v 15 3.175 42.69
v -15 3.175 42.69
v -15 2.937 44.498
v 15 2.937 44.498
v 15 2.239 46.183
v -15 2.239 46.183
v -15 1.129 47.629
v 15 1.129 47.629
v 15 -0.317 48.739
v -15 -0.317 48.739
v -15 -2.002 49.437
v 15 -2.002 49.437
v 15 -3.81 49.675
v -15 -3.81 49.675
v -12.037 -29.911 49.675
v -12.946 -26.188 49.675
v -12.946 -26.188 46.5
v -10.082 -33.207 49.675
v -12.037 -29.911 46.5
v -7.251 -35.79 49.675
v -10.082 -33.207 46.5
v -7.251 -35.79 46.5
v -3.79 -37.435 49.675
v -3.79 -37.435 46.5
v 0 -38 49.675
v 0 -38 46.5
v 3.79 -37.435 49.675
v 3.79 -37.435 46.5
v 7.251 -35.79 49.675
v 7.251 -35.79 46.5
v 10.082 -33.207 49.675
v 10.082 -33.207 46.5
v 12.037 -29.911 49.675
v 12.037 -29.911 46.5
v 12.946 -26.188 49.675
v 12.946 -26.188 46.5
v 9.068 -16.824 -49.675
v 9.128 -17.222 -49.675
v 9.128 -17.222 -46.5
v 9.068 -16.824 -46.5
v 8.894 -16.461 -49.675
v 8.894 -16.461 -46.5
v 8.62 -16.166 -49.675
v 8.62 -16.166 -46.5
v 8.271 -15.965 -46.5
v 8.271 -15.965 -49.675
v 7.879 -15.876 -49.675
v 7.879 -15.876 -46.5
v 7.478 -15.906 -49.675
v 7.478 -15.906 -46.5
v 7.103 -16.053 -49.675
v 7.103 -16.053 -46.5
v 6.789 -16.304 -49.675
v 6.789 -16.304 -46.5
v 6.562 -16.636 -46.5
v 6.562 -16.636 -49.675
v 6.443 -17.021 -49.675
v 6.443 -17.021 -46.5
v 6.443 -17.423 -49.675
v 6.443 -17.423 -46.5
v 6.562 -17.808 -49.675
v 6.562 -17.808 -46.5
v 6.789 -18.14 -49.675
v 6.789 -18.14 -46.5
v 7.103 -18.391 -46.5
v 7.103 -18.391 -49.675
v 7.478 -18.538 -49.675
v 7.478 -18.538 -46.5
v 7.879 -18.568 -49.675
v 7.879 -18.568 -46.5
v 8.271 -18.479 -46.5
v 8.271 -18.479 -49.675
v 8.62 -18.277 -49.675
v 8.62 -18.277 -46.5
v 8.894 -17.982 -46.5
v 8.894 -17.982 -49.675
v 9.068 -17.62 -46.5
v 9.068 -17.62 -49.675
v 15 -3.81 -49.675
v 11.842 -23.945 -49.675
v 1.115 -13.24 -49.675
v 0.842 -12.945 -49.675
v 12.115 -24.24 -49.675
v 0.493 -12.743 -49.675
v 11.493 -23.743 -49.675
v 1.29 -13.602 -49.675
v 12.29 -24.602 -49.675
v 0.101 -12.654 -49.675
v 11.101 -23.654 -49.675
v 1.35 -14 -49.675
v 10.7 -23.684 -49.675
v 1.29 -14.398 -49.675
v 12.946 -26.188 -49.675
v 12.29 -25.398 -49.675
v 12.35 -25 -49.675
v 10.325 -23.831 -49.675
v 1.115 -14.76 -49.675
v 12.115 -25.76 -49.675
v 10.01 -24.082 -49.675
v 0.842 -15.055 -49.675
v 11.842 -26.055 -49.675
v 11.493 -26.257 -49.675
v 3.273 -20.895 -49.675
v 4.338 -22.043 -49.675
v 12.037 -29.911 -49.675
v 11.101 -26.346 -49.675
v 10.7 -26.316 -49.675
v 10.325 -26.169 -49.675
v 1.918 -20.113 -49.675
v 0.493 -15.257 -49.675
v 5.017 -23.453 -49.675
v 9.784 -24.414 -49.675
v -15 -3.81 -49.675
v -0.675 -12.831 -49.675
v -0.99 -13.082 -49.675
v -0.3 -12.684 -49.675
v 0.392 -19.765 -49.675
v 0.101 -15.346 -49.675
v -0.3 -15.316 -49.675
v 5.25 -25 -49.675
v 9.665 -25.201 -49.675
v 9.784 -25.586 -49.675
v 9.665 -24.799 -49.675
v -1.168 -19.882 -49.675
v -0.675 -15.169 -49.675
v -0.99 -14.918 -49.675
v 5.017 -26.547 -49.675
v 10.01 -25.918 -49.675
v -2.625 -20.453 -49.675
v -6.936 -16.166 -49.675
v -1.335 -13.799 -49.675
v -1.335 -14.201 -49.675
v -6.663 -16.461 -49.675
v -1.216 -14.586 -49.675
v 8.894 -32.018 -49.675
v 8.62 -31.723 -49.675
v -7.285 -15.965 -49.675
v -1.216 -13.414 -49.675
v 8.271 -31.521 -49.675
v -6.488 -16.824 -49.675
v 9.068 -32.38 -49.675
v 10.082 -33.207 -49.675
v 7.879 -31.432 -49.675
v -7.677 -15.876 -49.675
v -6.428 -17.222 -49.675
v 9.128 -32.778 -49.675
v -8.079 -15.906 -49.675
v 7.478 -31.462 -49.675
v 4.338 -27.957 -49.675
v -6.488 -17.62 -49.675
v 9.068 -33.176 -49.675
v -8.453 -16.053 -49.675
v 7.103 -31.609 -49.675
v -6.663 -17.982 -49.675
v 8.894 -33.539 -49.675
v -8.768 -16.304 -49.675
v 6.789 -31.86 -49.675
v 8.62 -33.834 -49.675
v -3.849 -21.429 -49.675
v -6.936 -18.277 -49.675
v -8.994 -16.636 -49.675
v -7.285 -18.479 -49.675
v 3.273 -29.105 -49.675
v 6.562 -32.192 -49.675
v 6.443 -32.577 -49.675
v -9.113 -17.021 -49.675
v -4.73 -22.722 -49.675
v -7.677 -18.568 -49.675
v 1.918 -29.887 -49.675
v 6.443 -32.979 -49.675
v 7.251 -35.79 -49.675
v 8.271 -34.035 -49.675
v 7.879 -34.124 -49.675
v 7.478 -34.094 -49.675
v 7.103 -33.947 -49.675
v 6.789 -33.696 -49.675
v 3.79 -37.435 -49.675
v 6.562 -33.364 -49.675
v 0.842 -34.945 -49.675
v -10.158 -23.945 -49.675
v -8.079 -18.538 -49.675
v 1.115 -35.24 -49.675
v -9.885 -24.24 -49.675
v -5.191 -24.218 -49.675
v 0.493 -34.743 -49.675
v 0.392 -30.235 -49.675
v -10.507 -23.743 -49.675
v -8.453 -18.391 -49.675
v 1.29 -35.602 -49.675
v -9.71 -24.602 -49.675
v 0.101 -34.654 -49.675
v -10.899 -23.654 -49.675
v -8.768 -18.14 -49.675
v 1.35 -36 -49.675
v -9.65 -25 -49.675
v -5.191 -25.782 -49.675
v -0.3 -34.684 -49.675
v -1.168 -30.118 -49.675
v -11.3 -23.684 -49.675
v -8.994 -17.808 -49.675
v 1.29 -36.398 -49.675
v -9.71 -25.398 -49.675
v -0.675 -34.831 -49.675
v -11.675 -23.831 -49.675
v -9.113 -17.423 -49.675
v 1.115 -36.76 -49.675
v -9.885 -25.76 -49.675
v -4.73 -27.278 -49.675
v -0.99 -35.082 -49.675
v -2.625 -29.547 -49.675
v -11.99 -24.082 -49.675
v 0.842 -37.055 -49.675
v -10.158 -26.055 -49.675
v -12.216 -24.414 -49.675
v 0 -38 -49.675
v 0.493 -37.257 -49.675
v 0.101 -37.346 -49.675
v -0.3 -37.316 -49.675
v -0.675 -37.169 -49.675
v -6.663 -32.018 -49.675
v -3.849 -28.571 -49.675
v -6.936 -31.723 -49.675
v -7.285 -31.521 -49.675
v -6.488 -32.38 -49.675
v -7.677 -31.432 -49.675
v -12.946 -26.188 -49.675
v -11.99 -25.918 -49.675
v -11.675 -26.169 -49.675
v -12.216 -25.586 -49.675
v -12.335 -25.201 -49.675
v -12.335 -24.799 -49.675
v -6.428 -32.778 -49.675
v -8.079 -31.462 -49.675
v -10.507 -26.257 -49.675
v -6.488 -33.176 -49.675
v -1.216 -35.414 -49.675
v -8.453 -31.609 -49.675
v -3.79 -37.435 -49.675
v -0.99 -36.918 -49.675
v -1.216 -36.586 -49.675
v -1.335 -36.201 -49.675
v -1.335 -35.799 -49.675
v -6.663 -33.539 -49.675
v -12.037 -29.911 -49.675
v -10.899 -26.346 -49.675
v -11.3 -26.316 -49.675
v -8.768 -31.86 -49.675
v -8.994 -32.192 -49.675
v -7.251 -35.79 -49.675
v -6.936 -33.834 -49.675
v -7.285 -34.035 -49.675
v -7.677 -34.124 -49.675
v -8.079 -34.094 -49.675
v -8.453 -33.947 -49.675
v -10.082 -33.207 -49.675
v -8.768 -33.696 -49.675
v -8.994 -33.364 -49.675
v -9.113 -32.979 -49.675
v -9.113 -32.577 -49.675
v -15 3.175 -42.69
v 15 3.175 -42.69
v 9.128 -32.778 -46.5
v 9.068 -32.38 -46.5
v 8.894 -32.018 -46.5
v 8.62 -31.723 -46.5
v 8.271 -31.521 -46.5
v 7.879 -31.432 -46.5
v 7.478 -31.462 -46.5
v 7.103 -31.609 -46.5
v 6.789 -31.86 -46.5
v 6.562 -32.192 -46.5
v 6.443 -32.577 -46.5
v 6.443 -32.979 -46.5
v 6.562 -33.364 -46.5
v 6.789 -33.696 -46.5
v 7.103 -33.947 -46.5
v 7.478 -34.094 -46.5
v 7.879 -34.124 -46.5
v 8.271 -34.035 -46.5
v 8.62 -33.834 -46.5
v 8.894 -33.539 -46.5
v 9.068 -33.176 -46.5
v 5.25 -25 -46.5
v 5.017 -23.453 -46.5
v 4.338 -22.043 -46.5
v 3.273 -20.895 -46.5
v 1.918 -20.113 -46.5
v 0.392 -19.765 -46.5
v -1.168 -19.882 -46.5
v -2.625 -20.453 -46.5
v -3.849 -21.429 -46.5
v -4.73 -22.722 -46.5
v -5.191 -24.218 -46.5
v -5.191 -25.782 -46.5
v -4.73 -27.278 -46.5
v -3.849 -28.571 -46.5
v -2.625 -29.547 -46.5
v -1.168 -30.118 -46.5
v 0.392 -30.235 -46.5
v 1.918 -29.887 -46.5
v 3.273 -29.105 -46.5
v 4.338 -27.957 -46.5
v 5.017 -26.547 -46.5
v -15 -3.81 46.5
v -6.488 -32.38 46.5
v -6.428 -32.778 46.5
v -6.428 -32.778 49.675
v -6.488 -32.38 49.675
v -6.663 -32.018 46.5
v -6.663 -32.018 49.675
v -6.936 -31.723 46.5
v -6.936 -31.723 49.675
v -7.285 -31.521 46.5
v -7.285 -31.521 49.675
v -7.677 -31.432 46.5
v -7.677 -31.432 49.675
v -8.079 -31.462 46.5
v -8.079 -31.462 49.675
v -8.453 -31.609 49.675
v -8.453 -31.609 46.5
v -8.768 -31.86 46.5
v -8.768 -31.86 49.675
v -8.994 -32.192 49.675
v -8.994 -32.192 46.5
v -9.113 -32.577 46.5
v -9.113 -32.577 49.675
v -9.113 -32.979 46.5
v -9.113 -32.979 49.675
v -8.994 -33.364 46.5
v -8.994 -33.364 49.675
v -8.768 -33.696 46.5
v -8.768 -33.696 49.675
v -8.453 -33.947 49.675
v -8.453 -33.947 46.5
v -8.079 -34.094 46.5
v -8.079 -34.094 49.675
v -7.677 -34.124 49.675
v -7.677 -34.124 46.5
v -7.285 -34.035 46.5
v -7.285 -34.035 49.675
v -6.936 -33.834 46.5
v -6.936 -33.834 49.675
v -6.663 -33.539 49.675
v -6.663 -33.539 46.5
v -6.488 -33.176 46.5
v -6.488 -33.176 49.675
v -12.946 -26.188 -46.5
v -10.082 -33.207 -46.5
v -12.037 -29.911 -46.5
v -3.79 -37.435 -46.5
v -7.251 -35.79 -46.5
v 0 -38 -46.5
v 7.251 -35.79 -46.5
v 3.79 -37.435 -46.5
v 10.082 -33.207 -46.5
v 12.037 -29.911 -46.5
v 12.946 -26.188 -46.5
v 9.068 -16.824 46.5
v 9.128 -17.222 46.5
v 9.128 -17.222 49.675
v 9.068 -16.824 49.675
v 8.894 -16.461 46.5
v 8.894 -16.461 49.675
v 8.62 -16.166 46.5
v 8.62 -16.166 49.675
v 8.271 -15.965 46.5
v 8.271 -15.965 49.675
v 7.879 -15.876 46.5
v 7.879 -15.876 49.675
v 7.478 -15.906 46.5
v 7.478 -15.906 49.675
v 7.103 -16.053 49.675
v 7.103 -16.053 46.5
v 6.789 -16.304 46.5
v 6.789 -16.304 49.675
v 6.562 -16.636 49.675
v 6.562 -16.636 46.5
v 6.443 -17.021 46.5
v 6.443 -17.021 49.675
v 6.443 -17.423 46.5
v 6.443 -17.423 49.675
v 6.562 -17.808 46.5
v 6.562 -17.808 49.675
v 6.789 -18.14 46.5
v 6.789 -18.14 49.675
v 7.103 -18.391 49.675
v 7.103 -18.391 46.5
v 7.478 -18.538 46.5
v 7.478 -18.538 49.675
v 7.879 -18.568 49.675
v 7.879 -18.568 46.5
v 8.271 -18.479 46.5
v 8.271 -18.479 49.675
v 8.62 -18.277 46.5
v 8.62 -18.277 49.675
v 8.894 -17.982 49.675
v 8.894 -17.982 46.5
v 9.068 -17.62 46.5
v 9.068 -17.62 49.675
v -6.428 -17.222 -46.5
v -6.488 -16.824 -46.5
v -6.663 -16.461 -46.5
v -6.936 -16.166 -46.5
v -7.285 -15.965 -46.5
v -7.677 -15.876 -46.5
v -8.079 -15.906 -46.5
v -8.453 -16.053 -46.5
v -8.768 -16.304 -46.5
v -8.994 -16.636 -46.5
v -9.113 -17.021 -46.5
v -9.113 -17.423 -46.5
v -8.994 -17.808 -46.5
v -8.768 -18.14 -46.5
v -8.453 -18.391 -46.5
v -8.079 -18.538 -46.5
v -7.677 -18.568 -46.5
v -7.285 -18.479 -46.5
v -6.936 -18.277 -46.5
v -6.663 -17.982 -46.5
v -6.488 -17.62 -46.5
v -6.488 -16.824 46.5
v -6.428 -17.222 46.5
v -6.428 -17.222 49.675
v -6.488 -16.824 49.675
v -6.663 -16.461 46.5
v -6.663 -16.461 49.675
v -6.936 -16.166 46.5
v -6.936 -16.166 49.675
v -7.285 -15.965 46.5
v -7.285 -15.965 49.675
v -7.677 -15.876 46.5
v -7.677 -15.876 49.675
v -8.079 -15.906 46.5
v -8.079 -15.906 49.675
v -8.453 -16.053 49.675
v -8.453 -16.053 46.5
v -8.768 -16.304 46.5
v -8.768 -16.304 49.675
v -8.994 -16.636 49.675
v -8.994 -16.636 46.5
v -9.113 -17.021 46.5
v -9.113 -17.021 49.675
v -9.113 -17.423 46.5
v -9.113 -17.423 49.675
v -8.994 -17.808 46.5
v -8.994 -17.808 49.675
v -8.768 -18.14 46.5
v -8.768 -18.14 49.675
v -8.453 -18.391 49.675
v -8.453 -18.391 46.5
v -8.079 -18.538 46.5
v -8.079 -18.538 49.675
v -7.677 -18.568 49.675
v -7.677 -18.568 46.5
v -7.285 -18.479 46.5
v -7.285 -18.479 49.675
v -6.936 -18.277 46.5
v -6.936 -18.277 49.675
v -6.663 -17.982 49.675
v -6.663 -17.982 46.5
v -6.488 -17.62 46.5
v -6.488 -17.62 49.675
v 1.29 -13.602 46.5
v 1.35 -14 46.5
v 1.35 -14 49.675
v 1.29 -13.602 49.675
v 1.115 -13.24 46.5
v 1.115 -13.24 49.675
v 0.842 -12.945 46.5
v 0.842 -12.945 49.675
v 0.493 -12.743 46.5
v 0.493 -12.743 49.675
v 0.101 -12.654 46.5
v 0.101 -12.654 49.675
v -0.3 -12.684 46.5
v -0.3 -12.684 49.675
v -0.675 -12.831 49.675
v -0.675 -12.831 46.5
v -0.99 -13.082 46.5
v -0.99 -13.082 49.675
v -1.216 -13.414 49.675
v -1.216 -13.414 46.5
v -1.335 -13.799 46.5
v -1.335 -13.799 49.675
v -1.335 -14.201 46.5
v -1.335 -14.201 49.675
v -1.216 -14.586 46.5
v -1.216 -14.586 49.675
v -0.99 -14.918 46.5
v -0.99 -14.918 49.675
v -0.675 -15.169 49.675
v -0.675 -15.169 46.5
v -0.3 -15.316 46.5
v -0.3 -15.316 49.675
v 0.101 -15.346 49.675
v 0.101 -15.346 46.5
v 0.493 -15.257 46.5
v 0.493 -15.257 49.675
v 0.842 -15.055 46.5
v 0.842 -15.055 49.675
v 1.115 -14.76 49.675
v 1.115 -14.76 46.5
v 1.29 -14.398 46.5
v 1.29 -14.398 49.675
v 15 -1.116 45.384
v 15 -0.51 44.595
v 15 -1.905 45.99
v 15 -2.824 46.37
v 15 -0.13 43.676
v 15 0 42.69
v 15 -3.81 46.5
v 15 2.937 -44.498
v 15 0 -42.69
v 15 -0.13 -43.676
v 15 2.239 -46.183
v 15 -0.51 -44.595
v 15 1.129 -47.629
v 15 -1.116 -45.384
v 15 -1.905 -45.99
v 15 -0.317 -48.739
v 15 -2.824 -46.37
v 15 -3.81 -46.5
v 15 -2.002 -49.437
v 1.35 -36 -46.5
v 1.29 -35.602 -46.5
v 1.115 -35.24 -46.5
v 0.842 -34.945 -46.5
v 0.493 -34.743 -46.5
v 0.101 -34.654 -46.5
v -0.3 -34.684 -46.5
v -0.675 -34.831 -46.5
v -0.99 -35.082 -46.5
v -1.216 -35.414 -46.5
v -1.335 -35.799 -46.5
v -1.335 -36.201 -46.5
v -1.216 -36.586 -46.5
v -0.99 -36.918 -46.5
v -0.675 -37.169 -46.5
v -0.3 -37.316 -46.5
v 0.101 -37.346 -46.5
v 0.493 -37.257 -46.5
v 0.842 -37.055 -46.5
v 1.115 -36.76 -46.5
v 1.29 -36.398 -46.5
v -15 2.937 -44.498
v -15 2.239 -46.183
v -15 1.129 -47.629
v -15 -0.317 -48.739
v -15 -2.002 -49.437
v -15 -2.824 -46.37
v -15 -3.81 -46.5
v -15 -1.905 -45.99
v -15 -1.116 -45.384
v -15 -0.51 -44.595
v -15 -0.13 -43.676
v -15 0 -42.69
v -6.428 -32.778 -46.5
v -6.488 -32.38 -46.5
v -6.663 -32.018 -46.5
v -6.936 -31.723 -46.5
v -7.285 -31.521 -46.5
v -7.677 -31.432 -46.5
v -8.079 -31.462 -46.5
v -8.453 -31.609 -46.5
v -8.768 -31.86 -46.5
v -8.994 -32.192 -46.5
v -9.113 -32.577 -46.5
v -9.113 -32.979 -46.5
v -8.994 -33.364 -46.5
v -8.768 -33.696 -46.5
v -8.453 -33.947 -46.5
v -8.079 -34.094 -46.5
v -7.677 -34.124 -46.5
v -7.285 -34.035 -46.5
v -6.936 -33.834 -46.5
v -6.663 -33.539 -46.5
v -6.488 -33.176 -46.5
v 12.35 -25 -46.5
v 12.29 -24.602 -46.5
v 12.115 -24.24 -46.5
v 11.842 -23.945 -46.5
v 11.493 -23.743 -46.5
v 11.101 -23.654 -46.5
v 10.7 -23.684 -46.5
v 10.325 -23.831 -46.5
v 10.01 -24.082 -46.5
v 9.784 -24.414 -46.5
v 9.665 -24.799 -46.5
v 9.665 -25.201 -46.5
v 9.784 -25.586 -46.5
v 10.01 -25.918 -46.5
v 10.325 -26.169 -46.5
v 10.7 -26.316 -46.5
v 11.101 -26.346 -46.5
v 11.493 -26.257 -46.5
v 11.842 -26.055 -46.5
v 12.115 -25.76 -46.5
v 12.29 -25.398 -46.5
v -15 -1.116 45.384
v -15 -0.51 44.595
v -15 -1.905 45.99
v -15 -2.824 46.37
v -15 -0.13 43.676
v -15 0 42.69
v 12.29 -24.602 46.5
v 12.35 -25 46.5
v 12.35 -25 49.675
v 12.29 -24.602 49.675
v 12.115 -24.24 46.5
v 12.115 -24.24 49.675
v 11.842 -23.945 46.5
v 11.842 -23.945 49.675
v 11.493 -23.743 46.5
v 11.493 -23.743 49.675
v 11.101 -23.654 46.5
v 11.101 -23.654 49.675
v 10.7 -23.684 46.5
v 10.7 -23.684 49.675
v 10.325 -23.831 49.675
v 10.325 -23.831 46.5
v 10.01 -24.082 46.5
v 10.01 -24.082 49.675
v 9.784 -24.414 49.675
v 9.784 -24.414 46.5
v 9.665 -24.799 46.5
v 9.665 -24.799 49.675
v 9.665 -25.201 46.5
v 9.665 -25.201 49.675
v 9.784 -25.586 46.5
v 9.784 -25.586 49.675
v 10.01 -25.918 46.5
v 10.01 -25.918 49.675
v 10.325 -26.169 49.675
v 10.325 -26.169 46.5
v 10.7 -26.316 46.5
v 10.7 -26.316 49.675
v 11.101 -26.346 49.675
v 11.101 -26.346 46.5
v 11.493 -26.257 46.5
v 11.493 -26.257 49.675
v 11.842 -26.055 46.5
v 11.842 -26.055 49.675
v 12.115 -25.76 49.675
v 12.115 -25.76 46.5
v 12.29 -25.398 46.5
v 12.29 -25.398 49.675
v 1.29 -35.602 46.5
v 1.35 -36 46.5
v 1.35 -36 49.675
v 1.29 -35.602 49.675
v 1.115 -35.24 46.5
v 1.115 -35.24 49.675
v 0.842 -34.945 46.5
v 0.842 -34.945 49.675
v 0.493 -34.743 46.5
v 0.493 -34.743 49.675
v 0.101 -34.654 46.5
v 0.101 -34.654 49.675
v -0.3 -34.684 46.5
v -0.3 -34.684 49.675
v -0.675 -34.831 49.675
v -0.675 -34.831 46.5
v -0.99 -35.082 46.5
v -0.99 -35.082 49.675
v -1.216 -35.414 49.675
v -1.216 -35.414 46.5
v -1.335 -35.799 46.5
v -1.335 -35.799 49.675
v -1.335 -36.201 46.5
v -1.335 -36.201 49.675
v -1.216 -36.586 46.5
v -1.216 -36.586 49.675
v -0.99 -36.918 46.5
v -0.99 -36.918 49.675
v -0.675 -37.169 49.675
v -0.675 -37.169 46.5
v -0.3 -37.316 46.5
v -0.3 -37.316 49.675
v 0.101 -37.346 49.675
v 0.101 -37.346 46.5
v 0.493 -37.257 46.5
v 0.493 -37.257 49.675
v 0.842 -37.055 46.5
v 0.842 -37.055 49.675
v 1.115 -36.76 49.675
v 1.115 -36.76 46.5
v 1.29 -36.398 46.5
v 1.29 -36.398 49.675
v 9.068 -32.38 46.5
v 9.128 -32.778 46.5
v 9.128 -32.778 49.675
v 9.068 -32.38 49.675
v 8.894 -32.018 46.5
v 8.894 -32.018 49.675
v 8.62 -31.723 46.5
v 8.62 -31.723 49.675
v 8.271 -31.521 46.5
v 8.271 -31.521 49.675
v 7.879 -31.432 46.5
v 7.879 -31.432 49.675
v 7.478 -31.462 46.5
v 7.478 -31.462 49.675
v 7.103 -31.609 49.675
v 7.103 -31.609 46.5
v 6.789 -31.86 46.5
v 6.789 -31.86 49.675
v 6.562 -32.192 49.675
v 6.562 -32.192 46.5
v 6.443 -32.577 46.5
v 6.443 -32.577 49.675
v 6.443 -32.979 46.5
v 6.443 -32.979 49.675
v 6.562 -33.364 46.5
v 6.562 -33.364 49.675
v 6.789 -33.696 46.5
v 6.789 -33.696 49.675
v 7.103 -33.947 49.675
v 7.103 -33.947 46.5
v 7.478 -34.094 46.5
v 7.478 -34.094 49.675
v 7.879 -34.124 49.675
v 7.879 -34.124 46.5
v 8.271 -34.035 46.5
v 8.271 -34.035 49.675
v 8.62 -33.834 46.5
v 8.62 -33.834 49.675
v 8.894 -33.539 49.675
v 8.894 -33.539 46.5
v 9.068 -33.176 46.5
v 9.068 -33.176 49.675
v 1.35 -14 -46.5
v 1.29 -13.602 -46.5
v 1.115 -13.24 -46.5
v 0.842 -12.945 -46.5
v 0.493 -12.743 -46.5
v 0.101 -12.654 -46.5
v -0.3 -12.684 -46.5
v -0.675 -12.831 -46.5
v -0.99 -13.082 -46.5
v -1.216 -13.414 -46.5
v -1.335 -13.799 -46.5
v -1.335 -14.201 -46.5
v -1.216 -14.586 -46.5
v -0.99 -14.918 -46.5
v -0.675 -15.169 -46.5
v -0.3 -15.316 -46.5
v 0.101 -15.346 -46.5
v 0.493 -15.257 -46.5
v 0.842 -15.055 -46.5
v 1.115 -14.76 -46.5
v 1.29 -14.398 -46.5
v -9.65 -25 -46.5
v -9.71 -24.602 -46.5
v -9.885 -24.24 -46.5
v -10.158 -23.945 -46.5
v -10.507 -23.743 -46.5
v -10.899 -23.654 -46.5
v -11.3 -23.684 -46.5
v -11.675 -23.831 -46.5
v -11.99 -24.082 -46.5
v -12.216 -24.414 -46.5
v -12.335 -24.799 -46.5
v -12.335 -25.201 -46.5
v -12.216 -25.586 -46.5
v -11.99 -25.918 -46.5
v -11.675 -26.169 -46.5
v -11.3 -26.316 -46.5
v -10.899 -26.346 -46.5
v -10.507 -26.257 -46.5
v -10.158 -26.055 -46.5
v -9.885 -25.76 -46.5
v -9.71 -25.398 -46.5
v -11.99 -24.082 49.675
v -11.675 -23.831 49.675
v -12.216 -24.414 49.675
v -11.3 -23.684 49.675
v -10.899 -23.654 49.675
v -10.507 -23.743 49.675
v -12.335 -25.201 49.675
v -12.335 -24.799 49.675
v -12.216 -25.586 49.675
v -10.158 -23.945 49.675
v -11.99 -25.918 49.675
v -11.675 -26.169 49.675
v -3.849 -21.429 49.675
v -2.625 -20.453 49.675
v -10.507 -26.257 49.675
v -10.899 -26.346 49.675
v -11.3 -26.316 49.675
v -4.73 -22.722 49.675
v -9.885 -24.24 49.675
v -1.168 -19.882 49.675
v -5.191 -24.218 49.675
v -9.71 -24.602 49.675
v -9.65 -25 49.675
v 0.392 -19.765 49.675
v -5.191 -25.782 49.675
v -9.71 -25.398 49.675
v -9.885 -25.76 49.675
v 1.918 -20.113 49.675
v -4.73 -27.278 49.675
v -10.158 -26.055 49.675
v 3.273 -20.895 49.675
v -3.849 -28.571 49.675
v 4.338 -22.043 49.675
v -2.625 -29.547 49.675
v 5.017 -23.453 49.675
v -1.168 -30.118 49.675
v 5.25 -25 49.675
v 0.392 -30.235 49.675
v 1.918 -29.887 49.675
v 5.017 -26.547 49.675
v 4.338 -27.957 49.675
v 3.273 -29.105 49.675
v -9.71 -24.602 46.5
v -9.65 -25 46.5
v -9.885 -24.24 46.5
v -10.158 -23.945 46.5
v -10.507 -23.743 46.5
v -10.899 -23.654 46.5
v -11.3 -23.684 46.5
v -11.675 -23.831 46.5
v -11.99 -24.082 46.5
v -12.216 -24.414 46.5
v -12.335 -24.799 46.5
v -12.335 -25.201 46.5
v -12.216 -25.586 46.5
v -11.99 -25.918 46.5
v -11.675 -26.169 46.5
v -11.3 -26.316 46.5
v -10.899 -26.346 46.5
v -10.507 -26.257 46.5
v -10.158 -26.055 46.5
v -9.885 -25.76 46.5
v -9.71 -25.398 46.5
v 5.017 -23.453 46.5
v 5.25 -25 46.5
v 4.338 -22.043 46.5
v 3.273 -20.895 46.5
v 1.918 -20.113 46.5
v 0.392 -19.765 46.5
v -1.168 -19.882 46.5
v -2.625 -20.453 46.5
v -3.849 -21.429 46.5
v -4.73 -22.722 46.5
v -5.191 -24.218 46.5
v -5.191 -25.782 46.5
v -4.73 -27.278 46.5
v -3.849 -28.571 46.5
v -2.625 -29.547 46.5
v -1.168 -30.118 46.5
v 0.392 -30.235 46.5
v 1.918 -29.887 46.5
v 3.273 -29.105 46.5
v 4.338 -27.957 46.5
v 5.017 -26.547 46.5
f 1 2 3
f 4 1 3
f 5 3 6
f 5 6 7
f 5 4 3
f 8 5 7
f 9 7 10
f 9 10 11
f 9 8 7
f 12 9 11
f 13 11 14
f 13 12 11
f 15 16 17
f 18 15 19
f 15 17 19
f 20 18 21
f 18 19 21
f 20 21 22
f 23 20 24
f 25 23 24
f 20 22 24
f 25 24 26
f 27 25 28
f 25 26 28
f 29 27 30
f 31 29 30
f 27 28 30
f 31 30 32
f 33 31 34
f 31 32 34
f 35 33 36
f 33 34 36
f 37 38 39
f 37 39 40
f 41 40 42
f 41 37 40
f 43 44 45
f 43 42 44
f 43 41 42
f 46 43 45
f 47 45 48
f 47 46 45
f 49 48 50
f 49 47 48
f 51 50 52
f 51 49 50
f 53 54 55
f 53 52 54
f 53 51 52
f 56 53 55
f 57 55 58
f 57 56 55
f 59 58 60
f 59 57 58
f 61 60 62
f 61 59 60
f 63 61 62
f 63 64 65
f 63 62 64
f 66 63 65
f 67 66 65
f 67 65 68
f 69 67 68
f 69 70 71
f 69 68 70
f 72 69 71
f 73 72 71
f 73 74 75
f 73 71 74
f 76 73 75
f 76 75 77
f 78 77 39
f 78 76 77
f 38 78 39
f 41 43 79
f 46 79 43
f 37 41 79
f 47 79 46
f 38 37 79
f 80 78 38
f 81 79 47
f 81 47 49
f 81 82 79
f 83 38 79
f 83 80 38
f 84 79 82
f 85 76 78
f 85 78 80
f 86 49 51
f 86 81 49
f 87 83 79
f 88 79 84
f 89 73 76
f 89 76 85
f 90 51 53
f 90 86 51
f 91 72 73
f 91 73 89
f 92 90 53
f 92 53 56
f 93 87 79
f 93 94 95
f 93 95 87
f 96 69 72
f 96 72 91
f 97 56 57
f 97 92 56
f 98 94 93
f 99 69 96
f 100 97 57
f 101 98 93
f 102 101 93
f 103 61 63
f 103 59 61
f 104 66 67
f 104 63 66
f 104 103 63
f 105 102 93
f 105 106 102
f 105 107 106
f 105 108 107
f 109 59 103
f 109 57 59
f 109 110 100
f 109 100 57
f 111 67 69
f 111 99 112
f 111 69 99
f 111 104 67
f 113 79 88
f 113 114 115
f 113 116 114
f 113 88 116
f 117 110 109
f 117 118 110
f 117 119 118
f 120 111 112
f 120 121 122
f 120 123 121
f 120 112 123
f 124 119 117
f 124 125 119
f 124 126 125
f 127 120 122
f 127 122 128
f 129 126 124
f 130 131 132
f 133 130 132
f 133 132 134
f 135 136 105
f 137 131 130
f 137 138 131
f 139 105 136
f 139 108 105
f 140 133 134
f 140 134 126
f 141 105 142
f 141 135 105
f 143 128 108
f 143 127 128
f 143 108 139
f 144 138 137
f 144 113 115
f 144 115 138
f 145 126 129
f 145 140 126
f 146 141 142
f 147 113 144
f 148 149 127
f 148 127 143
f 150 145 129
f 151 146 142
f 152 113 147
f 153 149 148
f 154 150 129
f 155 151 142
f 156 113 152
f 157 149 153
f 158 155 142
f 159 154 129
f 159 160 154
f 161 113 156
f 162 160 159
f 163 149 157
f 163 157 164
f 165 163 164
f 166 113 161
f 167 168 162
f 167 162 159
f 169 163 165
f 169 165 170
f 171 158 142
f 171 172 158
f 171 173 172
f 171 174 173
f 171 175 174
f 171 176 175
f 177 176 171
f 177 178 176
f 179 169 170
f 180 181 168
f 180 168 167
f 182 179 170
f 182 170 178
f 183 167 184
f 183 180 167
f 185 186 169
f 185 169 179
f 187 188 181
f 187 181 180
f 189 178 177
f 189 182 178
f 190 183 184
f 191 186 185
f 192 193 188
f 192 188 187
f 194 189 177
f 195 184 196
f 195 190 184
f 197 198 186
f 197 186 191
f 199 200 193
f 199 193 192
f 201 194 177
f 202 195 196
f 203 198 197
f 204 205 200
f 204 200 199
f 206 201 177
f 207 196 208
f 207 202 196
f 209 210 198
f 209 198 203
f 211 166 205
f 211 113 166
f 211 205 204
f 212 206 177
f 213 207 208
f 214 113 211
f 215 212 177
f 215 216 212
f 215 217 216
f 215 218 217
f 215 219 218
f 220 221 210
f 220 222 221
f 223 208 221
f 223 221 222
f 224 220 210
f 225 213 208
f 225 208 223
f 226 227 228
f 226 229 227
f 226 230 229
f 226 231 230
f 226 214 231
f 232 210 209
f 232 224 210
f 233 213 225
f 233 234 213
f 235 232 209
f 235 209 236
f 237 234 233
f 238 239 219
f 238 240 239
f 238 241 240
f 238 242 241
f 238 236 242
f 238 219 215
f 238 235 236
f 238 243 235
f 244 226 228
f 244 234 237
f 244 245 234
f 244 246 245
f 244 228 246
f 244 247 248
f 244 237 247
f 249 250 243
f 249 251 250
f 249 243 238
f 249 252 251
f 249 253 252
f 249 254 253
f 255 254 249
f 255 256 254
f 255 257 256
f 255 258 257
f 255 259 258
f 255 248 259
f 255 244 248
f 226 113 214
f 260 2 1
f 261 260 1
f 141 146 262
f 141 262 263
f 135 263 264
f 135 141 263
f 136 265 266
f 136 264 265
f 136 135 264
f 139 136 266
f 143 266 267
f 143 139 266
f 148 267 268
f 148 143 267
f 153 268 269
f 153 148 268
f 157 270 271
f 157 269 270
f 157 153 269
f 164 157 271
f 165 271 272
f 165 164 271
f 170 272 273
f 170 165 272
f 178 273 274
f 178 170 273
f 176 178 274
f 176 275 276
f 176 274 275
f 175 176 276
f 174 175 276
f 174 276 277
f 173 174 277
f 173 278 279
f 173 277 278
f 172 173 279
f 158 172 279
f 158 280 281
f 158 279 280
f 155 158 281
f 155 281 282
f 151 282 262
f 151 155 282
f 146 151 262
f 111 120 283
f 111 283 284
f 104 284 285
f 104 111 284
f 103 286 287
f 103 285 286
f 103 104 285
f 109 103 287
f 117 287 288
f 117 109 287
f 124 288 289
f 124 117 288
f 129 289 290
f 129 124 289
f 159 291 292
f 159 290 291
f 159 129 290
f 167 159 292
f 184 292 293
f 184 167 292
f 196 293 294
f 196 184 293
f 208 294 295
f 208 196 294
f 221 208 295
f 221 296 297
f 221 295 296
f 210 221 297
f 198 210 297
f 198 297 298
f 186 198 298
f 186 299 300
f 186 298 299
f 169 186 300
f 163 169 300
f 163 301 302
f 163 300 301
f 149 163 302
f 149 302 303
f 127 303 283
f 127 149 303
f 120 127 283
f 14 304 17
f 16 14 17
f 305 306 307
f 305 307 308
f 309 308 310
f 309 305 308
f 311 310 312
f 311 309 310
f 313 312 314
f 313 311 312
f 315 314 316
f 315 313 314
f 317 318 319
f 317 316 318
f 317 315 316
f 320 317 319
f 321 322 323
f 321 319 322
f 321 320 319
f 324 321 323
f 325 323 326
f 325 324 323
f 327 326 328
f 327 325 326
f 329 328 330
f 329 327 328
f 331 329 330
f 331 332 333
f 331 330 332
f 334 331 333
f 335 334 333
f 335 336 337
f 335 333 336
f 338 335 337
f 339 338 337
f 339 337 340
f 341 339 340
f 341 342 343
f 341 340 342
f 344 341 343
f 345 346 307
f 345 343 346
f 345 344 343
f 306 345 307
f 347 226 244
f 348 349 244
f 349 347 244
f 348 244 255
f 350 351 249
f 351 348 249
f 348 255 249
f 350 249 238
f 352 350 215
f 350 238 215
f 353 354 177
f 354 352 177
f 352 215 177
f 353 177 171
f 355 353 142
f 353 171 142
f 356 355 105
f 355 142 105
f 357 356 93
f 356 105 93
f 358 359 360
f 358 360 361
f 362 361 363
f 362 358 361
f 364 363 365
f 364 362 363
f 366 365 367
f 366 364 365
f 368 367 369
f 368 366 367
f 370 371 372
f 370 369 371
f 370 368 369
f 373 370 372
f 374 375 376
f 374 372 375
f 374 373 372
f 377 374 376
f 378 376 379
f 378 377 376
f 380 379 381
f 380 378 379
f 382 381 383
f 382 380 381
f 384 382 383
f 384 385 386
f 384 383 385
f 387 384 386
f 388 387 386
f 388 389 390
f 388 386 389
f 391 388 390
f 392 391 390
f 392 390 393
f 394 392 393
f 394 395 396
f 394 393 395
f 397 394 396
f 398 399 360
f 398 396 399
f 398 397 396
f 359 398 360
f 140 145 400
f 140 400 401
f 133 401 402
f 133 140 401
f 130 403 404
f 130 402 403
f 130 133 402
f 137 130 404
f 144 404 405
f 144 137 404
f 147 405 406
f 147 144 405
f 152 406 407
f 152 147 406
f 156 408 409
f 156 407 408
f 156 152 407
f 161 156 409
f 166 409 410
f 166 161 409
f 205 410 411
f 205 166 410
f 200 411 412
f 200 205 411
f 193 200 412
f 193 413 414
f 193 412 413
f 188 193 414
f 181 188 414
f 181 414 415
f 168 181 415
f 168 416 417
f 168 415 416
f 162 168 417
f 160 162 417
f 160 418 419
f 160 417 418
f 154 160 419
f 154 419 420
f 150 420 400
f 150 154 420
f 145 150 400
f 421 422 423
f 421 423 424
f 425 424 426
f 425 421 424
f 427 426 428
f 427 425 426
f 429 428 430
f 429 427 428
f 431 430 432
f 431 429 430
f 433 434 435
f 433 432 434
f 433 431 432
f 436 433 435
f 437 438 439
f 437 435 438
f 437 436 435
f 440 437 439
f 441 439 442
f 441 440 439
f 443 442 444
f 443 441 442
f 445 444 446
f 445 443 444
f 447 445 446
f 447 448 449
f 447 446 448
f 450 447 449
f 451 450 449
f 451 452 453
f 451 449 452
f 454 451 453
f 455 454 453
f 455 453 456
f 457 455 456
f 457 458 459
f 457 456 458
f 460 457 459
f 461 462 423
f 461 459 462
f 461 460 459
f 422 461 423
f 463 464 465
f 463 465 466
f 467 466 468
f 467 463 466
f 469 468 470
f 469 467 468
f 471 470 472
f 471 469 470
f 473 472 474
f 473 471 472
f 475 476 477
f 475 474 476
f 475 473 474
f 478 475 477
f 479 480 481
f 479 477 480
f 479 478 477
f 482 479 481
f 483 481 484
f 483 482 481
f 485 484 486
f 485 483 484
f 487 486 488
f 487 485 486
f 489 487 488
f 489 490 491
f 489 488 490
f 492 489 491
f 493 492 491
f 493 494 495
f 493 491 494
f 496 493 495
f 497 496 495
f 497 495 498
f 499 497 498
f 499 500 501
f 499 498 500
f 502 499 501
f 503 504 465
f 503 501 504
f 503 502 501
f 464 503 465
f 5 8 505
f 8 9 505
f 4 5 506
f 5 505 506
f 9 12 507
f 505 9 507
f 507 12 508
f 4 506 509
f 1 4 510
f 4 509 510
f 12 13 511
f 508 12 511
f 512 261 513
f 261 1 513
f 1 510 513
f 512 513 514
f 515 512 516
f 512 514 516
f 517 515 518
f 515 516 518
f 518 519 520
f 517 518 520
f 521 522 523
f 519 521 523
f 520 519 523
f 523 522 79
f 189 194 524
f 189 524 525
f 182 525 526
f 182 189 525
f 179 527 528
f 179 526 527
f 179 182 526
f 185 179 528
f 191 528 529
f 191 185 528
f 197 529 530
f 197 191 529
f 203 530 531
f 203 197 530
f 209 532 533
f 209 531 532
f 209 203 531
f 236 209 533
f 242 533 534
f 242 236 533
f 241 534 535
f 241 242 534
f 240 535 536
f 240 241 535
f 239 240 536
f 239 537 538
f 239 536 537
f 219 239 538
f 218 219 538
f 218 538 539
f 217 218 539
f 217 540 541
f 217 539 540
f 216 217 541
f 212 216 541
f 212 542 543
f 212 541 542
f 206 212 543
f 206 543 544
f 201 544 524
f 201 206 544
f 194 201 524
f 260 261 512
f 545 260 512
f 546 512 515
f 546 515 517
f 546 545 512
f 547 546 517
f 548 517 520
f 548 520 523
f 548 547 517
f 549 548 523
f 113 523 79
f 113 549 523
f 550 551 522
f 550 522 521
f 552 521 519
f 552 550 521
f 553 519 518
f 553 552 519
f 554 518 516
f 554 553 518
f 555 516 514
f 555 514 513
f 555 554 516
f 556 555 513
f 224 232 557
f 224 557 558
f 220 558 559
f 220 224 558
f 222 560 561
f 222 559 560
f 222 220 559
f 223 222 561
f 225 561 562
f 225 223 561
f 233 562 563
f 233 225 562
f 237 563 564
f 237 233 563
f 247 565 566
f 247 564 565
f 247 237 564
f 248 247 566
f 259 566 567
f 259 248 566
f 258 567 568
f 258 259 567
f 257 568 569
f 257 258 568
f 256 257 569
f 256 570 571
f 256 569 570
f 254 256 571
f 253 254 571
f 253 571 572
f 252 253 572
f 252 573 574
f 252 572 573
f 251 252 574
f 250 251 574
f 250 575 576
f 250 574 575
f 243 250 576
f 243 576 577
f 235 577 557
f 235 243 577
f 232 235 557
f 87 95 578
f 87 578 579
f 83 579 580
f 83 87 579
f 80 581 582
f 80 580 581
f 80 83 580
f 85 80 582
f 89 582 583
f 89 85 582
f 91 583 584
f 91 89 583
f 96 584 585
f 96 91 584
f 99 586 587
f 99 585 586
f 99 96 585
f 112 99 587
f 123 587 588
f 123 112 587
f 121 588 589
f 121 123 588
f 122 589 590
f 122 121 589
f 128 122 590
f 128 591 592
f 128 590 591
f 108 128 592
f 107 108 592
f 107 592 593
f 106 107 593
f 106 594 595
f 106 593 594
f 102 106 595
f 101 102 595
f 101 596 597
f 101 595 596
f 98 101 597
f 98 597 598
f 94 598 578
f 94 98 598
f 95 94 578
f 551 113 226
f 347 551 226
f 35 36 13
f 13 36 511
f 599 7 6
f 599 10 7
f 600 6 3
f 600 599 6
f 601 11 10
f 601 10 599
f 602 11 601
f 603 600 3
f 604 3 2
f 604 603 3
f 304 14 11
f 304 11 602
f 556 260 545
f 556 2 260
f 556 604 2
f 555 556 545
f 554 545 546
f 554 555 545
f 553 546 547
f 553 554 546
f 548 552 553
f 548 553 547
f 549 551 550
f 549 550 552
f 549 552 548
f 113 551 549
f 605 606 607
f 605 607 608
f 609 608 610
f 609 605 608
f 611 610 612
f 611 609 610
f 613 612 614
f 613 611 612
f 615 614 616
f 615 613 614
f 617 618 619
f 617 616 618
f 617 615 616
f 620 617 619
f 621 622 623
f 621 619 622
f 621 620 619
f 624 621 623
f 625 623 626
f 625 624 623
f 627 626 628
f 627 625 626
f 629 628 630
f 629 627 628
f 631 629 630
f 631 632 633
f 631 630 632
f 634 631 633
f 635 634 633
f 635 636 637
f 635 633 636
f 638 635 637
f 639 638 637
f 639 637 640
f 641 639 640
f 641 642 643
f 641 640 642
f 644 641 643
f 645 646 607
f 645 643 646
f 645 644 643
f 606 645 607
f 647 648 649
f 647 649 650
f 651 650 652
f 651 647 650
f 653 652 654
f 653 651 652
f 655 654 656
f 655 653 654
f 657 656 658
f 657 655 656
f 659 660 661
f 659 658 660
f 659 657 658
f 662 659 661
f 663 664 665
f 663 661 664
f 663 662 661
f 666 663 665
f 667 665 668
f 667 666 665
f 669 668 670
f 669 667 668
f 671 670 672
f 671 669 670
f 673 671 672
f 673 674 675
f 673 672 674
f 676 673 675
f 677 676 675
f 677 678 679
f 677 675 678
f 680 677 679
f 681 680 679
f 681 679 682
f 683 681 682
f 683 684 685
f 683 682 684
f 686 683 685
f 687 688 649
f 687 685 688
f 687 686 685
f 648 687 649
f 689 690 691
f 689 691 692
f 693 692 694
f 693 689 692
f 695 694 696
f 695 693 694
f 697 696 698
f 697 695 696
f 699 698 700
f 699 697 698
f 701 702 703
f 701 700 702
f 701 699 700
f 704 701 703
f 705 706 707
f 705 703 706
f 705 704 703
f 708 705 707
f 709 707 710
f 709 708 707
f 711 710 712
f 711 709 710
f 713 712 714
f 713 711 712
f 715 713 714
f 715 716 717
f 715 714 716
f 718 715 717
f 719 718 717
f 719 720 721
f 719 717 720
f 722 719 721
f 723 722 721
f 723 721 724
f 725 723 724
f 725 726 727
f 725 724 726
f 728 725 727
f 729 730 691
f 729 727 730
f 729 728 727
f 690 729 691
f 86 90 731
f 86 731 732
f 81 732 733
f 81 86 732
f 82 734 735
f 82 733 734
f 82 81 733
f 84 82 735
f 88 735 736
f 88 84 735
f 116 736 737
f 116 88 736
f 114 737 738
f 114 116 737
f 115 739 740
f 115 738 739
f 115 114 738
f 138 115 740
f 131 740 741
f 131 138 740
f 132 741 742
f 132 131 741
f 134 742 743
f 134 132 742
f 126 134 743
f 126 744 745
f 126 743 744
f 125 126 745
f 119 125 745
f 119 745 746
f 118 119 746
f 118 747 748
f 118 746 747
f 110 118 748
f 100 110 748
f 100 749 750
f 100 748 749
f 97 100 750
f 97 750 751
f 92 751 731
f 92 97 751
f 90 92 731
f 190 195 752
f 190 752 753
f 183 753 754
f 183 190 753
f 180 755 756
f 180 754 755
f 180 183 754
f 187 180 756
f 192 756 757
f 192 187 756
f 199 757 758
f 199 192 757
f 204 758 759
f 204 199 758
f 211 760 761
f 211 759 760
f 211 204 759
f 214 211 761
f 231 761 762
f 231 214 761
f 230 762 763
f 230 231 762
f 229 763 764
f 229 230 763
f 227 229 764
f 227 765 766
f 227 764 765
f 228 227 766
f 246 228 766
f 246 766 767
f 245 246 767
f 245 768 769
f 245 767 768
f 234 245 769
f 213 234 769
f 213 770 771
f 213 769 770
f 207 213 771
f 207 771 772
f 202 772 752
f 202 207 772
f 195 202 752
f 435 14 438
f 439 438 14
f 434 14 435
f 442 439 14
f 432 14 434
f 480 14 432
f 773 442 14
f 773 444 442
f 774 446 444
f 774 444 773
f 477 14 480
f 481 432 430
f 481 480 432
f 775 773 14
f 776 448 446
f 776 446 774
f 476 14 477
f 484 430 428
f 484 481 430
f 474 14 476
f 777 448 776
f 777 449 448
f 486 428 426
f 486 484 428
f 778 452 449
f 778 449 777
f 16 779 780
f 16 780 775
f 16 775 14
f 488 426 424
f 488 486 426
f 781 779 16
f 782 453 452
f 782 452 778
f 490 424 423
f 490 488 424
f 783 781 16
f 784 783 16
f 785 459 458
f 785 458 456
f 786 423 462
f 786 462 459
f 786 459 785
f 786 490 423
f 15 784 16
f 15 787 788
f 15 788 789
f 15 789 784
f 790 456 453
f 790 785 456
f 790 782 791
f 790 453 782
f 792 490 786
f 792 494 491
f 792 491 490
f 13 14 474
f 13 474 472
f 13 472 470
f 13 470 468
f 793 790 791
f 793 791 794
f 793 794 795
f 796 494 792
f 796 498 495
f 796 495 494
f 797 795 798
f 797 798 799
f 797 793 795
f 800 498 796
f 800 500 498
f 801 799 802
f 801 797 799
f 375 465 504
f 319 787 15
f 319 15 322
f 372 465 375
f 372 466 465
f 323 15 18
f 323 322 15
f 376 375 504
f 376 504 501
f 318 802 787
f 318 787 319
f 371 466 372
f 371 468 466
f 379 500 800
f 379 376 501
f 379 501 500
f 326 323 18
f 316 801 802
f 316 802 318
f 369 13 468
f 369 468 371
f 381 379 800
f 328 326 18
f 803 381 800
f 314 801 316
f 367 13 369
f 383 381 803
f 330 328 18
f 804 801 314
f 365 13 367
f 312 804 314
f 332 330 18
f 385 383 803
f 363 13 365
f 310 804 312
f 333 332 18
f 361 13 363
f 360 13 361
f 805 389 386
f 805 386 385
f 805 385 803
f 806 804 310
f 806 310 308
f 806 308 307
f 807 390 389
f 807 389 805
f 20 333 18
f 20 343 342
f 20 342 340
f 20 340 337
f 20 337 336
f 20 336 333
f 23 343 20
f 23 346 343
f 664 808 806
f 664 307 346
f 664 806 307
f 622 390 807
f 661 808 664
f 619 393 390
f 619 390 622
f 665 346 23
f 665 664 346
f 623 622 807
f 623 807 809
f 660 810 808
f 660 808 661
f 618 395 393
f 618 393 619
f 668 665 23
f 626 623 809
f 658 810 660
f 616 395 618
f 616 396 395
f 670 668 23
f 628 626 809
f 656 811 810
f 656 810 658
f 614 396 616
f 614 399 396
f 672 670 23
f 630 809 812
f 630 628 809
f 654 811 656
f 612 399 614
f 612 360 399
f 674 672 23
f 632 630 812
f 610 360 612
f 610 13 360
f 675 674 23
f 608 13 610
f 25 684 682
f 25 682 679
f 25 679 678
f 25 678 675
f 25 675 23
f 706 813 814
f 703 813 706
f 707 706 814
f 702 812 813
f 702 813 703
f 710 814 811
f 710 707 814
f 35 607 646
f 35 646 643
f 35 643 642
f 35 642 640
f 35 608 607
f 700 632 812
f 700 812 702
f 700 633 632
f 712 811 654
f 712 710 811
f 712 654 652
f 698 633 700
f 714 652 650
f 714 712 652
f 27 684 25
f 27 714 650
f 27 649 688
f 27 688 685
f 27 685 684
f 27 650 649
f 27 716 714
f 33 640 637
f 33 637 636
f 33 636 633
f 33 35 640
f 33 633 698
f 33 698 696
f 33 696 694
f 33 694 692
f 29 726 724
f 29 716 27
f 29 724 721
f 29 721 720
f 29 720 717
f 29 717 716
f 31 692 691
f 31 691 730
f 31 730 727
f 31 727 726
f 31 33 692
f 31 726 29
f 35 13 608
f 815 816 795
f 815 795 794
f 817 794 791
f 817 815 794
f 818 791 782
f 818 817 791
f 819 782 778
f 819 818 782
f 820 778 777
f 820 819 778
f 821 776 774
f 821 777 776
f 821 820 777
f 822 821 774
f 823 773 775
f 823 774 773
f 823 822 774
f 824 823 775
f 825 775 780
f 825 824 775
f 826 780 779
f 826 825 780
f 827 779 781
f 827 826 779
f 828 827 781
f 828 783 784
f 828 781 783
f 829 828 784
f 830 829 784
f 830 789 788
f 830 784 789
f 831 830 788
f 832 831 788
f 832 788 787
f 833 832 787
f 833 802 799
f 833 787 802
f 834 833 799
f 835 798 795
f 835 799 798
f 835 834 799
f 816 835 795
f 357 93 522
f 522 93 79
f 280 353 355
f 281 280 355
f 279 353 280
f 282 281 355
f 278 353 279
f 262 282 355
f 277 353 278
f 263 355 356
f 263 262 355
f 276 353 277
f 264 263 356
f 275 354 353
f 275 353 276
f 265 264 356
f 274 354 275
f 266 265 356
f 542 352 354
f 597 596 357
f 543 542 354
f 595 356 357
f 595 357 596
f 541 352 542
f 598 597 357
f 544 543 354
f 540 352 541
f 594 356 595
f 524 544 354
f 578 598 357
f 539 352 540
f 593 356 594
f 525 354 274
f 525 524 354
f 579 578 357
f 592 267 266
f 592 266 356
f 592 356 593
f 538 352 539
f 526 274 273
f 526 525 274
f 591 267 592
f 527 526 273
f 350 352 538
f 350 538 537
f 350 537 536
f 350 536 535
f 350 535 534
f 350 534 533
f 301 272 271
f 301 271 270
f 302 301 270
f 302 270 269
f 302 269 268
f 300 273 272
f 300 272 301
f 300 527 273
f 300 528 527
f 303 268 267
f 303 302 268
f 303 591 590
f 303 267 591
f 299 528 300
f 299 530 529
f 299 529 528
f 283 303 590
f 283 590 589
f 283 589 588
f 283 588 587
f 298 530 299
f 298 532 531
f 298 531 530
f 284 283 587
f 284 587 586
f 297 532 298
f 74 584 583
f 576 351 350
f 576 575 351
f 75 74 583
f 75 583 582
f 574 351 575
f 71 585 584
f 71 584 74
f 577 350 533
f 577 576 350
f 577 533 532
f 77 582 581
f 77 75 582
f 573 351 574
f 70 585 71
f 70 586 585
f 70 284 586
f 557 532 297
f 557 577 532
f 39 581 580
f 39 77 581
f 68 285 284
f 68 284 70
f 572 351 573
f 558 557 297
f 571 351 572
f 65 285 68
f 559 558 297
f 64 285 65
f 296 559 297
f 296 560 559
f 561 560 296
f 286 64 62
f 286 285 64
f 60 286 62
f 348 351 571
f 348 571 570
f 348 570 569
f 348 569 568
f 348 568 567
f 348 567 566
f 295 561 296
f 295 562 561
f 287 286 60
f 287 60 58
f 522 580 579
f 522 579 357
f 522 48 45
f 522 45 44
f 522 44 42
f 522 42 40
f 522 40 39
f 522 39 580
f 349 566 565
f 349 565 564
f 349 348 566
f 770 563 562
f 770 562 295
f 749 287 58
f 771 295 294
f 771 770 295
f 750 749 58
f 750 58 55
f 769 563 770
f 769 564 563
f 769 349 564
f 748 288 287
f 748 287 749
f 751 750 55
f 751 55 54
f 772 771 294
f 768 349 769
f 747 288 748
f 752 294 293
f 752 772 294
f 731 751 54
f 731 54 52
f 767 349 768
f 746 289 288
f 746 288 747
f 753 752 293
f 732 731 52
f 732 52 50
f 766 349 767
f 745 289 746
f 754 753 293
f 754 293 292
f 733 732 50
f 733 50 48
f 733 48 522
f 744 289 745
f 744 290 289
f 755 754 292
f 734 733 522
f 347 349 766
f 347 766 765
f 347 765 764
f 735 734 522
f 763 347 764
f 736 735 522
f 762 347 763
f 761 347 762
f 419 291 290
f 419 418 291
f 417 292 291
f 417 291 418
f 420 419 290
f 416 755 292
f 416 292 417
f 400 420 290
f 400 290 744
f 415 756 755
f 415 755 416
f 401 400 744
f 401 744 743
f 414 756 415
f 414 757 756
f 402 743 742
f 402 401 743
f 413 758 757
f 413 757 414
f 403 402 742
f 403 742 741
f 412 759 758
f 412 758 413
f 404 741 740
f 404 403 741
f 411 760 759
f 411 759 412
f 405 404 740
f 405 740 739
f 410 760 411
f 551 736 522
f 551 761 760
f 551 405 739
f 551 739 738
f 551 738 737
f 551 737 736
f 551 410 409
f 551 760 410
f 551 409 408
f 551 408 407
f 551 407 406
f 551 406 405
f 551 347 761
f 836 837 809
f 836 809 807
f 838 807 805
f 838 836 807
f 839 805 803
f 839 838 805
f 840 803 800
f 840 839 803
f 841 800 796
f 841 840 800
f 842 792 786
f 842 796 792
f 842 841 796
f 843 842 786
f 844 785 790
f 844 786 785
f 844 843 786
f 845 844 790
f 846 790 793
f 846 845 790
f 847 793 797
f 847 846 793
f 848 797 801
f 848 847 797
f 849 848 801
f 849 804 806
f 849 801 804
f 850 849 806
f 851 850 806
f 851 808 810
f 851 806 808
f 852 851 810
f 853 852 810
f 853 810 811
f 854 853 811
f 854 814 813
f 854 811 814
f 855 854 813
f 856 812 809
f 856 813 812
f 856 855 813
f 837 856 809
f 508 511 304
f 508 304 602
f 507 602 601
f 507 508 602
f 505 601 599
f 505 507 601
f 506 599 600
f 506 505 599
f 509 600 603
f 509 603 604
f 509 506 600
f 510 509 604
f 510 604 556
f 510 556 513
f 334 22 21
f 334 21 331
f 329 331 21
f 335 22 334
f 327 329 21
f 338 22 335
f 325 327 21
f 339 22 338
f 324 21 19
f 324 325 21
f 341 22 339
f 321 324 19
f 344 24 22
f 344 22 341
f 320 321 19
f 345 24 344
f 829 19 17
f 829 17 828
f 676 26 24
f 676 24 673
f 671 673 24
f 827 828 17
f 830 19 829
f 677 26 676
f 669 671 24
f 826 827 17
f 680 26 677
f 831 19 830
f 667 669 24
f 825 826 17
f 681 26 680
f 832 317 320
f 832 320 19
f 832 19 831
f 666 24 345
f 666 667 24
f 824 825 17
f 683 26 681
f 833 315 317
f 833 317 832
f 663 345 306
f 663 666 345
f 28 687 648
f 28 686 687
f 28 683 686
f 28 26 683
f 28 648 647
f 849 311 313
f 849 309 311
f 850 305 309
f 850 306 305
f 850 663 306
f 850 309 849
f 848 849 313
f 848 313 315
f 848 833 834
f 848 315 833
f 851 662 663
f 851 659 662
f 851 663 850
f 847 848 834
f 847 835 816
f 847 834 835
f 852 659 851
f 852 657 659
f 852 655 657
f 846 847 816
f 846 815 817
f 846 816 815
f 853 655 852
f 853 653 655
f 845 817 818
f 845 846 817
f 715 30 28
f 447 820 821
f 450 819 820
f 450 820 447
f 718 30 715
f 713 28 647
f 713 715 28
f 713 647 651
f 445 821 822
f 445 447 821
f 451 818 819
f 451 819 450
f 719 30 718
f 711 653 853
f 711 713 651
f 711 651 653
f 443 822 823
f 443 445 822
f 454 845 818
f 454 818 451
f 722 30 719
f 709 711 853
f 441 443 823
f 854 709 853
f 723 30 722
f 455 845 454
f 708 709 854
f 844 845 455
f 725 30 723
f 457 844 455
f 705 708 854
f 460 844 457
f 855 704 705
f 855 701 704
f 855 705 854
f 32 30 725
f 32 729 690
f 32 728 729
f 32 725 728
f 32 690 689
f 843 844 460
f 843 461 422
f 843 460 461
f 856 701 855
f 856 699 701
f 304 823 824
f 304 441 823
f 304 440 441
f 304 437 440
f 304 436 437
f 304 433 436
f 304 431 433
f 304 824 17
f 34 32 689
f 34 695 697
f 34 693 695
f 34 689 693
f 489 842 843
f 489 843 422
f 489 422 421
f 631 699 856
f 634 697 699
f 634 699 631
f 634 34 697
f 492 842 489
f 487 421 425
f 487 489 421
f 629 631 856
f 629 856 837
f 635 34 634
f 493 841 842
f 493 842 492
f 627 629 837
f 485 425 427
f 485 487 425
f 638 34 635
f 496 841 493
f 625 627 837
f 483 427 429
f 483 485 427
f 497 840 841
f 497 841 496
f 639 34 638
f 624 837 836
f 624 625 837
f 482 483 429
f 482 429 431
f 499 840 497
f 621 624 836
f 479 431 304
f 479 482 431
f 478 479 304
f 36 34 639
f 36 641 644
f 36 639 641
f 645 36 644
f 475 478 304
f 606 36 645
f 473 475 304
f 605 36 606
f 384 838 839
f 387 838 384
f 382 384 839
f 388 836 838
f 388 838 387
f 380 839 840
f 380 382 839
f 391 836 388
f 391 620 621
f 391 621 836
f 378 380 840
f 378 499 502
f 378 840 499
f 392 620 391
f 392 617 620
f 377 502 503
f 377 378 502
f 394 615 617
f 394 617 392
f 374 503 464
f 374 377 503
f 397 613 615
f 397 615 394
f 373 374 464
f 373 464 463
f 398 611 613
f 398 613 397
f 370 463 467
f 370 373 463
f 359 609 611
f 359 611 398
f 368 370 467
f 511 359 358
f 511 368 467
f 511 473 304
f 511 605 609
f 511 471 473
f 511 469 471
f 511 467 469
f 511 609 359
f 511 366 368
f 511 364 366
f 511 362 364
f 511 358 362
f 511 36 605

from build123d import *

# Parameters (mm, degrees)
SKETCH1_W                      = 30
SKETCH1_H                      = 93
BASE_FLANGE1_DEPTH             = 3.175
EDGE_FLANGE1_STRIP_W           = 20.32
EDGE_FLANGE1_STRIP_H           = 3.175
EDGE_FLANGE1_STRIP_CUT_DEPTH   = 30
EDGE_FLANGE1_STRIP_2_W         = 20.32
EDGE_FLANGE1_STRIP_2_H         = 3.175
EDGE_FLANGE1_STRIP_CUT_2_DEPTH = 30
EDGE_FLANGE1_DEPTH             = 30
EDGE_FLANGE1_BEND_DEPTH        = 30
CUT_EXTRUDE1_DEPTH             = 65.316449101
CUT_EXTRUDE1_DEPTH_BACK        = 65.316449101
SKETCH12_OUTSIDE_W             = 54.33
SKETCH12_OUTSIDE_H             = 65.505
SKETCH12_OUTSIDE_R             = 1.35
SKETCH12_OUTSIDE_R_2           = 5.25


# Sheet-metal steps are written as plain solids
with BuildPart() as part:
    # Sketch1 → Base-Flange1 (new body)
    with BuildSketch(Plane(origin=(0, 0, 0), x_dir=(1, 0, 0), z_dir=(0, 1, 0))):
        Rectangle(SKETCH1_W, SKETCH1_H)
    extrude(amount=BASE_FLANGE1_DEPTH)

    # Edge-Flange1 strip (across the edge) → Edge-Flange1 strip cut (cut)
    with BuildSketch(Plane(origin=(15, 0, 46.5), x_dir=(0, 0, -1), z_dir=(-1, 0, 0))):
        with Locations((-6.35, -1.5875)):
            Rectangle(EDGE_FLANGE1_STRIP_W, EDGE_FLANGE1_STRIP_H)
    extrude(amount=EDGE_FLANGE1_STRIP_CUT_DEPTH, mode=Mode.SUBTRACT)

    # Edge-Flange1 strip 2 (across the edge) → Edge-Flange1 strip cut 2 (cut)
    with BuildSketch(Plane(origin=(-15, 0, -46.5), x_dir=(0, 0, 1), z_dir=(1, 0, 0))):
        with Locations((-6.35, -1.5875)):
            Rectangle(EDGE_FLANGE1_STRIP_2_W, EDGE_FLANGE1_STRIP_2_H)
    extrude(amount=EDGE_FLANGE1_STRIP_CUT_2_DEPTH, mode=Mode.SUBTRACT)

    # Edge-Flange1 section (across the edge) → Edge-Flange1 (add)
    with BuildSketch(Plane(origin=(15, 0, 46.5), x_dir=(0, 0, -1), z_dir=(-1, 0, 0))):
        with BuildLine():
            Line((-3.175, 3.81), (-3.175, 38))
            Line((-3.175, 38), (0, 38))
            Line((0, 38), (0, 3.81))
            ThreePointArc((0, 3.81), (1.115923164, 1.115923164), (3.81, 0))
            Line((3.81, 0), (3.81, -3.175))
            ThreePointArc((3.81, -3.175), (-1.129140867, -1.129140867), (-3.175, 3.81))
        make_face()
    extrude(amount=EDGE_FLANGE1_DEPTH)

    # Edge-Flange1 section 2 (across the edge) → Edge-Flange1 bend (add)
    with BuildSketch(Plane(origin=(-15, 0, -46.5), x_dir=(0, 0, 1), z_dir=(1, 0, 0))):
        with BuildLine():
            Line((-3.175, 3.81), (-3.175, 38))
            Line((-3.175, 38), (0, 38))
            Line((0, 38), (0, 3.81))
            ThreePointArc((0, 3.81), (1.115923164, 1.115923164), (3.81, 0))
            Line((3.81, 0), (3.81, -3.175))
            ThreePointArc((3.81, -3.175), (-1.129140867, -1.129140867), (-3.175, 3.81))
        make_face()
    extrude(amount=EDGE_FLANGE1_BEND_DEPTH)

    # Sketch12 outside → Cut-Extrude1 (cut, two sides: drawn at the far end of the back side and taken through both)
    # profile 1 of 10: a face of its own
    with BuildSketch(Plane.XY.offset(-CUT_EXTRUDE1_DEPTH_BACK)):
        with Locations((0, -17.4125)):
            Rectangle(SKETCH12_OUTSIDE_W, SKETCH12_OUTSIDE_H)
        with BuildLine():
            Line((12.945561693, -26.188458018), (15, -3.81))
            Line((15, -3.81), (15, 3.175))
            Line((15, 3.175), (-15, 3.175))
            Line((-15, 3.175), (-15, -3.81))
            Line((-15, -3.81), (-12.945561693, -26.188458018))
            ThreePointArc((-12.945561693, -26.188458018), (0, -38), (12.945561693, -26.188458018))
        make_face(mode=Mode.SUBTRACT)
    # profile 2 of 10: a face of its own
    with BuildSketch(Plane.XY.offset(-CUT_EXTRUDE1_DEPTH_BACK)):
        with Locations((0, -36)):
            Circle(SKETCH12_OUTSIDE_R)
    # profile 3 of 10: a face of its own
    with BuildSketch(Plane.XY.offset(-CUT_EXTRUDE1_DEPTH_BACK)):
        with Locations((-7.778174593, -32.778174593)):
            Circle(SKETCH12_OUTSIDE_R)
    # profile 4 of 10: a face of its own
    with BuildSketch(Plane.XY.offset(-CUT_EXTRUDE1_DEPTH_BACK)):
        with Locations((-11, -25)):
            Circle(SKETCH12_OUTSIDE_R)
    # profile 5 of 10: a face of its own
    with BuildSketch(Plane.XY.offset(-CUT_EXTRUDE1_DEPTH_BACK)):
        with Locations((-7.778174593, -17.221825407)):
            Circle(SKETCH12_OUTSIDE_R)
    # profile 6 of 10: a face of its own
    with BuildSketch(Plane.XY.offset(-CUT_EXTRUDE1_DEPTH_BACK)):
        with Locations((0, -14)):
            Circle(SKETCH12_OUTSIDE_R)
    # profile 7 of 10: a face of its own
    with BuildSketch(Plane.XY.offset(-CUT_EXTRUDE1_DEPTH_BACK)):
        with Locations((7.778174593, -17.221825407)):
            Circle(SKETCH12_OUTSIDE_R)
    # profile 8 of 10: a face of its own
    with BuildSketch(Plane.XY.offset(-CUT_EXTRUDE1_DEPTH_BACK)):
        with Locations((11, -25)):
            Circle(SKETCH12_OUTSIDE_R)
    # profile 9 of 10: a face of its own
    with BuildSketch(Plane.XY.offset(-CUT_EXTRUDE1_DEPTH_BACK)):
        with Locations((7.778174593, -32.778174593)):
            Circle(SKETCH12_OUTSIDE_R)
    # profile 10 of 10: a face of its own
    with BuildSketch(Plane.XY.offset(-CUT_EXTRUDE1_DEPTH_BACK)):
        with Locations((0, -25)):
            Circle(SKETCH12_OUTSIDE_R_2)
    extrude(amount=CUT_EXTRUDE1_DEPTH + CUT_EXTRUDE1_DEPTH_BACK, mode=Mode.SUBTRACT)


solid = part.part
